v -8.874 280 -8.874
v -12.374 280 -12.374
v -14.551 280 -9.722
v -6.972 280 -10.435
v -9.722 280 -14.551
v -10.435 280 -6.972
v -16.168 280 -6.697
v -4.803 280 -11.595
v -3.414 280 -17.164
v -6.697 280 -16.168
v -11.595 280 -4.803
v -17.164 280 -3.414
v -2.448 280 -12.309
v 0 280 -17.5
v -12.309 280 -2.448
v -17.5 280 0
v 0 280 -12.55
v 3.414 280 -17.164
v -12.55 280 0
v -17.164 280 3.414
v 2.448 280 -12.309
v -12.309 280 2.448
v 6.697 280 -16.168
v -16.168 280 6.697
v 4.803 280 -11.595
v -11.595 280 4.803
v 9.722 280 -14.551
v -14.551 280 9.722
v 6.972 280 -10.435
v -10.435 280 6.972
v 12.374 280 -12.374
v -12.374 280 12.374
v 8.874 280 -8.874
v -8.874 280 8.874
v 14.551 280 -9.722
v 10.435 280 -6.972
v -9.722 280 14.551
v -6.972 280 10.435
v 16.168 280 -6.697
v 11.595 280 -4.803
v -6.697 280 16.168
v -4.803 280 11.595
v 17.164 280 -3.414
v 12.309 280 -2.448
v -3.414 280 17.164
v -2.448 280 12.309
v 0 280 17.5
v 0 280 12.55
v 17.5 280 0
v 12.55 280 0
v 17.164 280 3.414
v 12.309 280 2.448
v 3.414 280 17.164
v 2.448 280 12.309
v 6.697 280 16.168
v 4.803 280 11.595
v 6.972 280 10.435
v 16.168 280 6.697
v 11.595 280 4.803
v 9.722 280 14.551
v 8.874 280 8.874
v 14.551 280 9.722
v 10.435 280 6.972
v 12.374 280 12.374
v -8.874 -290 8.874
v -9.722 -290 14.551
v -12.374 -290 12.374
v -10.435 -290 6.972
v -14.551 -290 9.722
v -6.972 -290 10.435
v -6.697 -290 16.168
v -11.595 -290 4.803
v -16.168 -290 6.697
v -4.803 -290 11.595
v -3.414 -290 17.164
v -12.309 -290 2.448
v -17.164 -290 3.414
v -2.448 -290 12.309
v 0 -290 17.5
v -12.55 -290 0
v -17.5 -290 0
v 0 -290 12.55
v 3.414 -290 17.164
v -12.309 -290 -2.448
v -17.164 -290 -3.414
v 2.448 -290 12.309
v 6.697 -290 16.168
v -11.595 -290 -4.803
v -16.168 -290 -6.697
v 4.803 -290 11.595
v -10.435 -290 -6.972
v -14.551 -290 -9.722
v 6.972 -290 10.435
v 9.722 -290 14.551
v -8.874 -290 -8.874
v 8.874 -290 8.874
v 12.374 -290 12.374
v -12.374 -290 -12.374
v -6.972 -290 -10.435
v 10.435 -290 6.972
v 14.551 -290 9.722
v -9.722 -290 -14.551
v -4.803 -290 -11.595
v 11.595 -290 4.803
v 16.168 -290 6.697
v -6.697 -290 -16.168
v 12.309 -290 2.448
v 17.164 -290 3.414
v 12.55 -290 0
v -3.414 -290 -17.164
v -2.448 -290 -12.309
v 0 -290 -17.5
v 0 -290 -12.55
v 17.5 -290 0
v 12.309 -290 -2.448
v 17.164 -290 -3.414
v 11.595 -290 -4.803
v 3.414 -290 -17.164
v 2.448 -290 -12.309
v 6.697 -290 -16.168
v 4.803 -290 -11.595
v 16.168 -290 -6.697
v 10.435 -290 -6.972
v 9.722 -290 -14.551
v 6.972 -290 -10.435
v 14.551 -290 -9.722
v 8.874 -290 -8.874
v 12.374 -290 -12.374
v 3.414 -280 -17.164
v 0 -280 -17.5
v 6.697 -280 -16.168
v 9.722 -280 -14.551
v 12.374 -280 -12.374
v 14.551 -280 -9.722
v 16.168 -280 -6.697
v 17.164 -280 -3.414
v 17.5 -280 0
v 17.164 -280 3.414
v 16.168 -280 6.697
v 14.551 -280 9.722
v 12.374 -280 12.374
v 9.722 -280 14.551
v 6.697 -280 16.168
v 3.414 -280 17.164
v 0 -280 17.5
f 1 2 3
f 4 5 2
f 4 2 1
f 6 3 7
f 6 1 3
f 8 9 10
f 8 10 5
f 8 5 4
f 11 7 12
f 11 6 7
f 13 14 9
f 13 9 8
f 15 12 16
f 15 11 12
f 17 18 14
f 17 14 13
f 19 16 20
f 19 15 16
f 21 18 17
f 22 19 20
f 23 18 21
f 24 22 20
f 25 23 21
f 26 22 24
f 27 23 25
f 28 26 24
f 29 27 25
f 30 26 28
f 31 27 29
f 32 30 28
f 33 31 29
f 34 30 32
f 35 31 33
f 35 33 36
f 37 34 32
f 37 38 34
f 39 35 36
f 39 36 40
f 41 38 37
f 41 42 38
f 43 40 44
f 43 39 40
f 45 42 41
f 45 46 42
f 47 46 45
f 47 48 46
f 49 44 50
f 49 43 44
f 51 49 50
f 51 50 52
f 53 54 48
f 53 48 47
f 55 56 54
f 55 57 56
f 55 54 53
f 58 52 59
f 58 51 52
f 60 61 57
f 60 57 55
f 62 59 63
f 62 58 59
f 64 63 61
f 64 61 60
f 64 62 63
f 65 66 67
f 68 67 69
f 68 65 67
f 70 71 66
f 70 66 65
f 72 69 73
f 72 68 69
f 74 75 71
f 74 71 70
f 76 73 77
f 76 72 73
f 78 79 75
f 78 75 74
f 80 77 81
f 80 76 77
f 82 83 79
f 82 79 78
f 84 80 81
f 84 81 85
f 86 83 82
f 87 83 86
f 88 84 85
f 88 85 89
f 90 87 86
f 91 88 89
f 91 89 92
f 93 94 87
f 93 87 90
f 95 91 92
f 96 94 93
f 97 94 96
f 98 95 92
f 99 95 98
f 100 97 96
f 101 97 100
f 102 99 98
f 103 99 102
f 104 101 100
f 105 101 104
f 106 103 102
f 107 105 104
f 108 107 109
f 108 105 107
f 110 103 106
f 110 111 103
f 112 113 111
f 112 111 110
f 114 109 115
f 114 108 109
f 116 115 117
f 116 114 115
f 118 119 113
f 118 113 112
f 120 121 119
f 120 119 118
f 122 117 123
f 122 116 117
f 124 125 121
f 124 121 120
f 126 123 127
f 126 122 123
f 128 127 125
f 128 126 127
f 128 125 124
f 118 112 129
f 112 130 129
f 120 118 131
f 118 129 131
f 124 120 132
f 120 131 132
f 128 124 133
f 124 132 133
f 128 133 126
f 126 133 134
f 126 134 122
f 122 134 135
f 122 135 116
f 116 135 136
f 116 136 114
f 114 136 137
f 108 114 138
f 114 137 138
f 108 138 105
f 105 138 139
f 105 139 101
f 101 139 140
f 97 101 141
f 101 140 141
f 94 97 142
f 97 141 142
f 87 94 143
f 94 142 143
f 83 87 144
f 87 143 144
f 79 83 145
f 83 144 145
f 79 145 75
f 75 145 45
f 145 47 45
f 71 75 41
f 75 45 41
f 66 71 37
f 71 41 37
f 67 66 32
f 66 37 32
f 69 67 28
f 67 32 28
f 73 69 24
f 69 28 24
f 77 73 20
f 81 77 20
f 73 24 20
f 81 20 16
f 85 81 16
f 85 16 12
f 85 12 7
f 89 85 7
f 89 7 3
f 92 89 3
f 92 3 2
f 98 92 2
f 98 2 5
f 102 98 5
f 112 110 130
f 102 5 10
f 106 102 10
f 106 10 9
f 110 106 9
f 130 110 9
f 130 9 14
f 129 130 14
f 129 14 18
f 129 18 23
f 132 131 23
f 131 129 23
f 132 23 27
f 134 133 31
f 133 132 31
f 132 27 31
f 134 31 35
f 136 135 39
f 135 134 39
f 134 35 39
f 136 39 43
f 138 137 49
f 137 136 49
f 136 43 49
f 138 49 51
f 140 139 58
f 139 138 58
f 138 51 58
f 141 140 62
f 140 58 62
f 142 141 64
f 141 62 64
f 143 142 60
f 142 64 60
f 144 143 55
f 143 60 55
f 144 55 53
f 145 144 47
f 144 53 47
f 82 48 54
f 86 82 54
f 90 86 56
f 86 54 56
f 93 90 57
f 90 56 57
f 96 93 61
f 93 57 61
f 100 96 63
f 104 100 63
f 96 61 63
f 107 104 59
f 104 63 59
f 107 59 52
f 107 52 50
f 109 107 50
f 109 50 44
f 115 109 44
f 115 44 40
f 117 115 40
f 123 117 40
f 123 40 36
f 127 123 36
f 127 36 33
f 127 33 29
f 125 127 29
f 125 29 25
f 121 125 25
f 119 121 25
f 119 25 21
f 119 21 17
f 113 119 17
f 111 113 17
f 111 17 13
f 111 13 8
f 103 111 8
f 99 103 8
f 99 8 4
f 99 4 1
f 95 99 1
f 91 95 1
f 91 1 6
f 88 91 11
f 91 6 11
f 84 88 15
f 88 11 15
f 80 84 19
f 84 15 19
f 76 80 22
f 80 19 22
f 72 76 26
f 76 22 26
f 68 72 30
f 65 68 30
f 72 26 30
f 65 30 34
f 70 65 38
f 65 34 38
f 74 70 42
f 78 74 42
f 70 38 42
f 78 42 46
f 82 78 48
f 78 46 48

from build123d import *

# Parameters (mm, degrees)
SKETCH1_R           = 17.5
SKETCH1_R_2         = 12.5
BOSS_EXTRUDE1_DEPTH = 280
SKETCH8_R           = 17.5
BOSS_EXTRUDE3_DEPTH = 10
SKETCH9_R           = 12.55
CUT_EXTRUDE2_DEPTH  = 899.5


with BuildPart() as part:
    # Sketch1 → Boss-Extrude1 (new, symmetric)
    with BuildSketch(Plane(origin=(0, 0, 0), x_dir=(1, 0, 0), z_dir=(0, 1, 0))):
        Circle(SKETCH1_R)
        Circle(SKETCH1_R_2, mode=Mode.SUBTRACT)
    extrude(amount=BOSS_EXTRUDE1_DEPTH, both=True)

    # Sketch8 → Boss-Extrude3 (add)
    with BuildSketch(Plane.XZ.offset(280)):
        Circle(SKETCH8_R)
    extrude(amount=BOSS_EXTRUDE3_DEPTH)

    # Sketch9 → Cut-Extrude2 (cut)
    with BuildSketch(Plane(origin=(-32.302786122, 416.289190775, -45.221901395), x_dir=(-0.9768887275019512, 0, 0.2137484832217963), z_dir=(0, 1, 0))):
        with Locations((-21.890114798, 51.081437247)):
            Circle(SKETCH9_R)
    extrude(amount=-CUT_EXTRUDE2_DEPTH, mode=Mode.SUBTRACT)


solid = part.part
